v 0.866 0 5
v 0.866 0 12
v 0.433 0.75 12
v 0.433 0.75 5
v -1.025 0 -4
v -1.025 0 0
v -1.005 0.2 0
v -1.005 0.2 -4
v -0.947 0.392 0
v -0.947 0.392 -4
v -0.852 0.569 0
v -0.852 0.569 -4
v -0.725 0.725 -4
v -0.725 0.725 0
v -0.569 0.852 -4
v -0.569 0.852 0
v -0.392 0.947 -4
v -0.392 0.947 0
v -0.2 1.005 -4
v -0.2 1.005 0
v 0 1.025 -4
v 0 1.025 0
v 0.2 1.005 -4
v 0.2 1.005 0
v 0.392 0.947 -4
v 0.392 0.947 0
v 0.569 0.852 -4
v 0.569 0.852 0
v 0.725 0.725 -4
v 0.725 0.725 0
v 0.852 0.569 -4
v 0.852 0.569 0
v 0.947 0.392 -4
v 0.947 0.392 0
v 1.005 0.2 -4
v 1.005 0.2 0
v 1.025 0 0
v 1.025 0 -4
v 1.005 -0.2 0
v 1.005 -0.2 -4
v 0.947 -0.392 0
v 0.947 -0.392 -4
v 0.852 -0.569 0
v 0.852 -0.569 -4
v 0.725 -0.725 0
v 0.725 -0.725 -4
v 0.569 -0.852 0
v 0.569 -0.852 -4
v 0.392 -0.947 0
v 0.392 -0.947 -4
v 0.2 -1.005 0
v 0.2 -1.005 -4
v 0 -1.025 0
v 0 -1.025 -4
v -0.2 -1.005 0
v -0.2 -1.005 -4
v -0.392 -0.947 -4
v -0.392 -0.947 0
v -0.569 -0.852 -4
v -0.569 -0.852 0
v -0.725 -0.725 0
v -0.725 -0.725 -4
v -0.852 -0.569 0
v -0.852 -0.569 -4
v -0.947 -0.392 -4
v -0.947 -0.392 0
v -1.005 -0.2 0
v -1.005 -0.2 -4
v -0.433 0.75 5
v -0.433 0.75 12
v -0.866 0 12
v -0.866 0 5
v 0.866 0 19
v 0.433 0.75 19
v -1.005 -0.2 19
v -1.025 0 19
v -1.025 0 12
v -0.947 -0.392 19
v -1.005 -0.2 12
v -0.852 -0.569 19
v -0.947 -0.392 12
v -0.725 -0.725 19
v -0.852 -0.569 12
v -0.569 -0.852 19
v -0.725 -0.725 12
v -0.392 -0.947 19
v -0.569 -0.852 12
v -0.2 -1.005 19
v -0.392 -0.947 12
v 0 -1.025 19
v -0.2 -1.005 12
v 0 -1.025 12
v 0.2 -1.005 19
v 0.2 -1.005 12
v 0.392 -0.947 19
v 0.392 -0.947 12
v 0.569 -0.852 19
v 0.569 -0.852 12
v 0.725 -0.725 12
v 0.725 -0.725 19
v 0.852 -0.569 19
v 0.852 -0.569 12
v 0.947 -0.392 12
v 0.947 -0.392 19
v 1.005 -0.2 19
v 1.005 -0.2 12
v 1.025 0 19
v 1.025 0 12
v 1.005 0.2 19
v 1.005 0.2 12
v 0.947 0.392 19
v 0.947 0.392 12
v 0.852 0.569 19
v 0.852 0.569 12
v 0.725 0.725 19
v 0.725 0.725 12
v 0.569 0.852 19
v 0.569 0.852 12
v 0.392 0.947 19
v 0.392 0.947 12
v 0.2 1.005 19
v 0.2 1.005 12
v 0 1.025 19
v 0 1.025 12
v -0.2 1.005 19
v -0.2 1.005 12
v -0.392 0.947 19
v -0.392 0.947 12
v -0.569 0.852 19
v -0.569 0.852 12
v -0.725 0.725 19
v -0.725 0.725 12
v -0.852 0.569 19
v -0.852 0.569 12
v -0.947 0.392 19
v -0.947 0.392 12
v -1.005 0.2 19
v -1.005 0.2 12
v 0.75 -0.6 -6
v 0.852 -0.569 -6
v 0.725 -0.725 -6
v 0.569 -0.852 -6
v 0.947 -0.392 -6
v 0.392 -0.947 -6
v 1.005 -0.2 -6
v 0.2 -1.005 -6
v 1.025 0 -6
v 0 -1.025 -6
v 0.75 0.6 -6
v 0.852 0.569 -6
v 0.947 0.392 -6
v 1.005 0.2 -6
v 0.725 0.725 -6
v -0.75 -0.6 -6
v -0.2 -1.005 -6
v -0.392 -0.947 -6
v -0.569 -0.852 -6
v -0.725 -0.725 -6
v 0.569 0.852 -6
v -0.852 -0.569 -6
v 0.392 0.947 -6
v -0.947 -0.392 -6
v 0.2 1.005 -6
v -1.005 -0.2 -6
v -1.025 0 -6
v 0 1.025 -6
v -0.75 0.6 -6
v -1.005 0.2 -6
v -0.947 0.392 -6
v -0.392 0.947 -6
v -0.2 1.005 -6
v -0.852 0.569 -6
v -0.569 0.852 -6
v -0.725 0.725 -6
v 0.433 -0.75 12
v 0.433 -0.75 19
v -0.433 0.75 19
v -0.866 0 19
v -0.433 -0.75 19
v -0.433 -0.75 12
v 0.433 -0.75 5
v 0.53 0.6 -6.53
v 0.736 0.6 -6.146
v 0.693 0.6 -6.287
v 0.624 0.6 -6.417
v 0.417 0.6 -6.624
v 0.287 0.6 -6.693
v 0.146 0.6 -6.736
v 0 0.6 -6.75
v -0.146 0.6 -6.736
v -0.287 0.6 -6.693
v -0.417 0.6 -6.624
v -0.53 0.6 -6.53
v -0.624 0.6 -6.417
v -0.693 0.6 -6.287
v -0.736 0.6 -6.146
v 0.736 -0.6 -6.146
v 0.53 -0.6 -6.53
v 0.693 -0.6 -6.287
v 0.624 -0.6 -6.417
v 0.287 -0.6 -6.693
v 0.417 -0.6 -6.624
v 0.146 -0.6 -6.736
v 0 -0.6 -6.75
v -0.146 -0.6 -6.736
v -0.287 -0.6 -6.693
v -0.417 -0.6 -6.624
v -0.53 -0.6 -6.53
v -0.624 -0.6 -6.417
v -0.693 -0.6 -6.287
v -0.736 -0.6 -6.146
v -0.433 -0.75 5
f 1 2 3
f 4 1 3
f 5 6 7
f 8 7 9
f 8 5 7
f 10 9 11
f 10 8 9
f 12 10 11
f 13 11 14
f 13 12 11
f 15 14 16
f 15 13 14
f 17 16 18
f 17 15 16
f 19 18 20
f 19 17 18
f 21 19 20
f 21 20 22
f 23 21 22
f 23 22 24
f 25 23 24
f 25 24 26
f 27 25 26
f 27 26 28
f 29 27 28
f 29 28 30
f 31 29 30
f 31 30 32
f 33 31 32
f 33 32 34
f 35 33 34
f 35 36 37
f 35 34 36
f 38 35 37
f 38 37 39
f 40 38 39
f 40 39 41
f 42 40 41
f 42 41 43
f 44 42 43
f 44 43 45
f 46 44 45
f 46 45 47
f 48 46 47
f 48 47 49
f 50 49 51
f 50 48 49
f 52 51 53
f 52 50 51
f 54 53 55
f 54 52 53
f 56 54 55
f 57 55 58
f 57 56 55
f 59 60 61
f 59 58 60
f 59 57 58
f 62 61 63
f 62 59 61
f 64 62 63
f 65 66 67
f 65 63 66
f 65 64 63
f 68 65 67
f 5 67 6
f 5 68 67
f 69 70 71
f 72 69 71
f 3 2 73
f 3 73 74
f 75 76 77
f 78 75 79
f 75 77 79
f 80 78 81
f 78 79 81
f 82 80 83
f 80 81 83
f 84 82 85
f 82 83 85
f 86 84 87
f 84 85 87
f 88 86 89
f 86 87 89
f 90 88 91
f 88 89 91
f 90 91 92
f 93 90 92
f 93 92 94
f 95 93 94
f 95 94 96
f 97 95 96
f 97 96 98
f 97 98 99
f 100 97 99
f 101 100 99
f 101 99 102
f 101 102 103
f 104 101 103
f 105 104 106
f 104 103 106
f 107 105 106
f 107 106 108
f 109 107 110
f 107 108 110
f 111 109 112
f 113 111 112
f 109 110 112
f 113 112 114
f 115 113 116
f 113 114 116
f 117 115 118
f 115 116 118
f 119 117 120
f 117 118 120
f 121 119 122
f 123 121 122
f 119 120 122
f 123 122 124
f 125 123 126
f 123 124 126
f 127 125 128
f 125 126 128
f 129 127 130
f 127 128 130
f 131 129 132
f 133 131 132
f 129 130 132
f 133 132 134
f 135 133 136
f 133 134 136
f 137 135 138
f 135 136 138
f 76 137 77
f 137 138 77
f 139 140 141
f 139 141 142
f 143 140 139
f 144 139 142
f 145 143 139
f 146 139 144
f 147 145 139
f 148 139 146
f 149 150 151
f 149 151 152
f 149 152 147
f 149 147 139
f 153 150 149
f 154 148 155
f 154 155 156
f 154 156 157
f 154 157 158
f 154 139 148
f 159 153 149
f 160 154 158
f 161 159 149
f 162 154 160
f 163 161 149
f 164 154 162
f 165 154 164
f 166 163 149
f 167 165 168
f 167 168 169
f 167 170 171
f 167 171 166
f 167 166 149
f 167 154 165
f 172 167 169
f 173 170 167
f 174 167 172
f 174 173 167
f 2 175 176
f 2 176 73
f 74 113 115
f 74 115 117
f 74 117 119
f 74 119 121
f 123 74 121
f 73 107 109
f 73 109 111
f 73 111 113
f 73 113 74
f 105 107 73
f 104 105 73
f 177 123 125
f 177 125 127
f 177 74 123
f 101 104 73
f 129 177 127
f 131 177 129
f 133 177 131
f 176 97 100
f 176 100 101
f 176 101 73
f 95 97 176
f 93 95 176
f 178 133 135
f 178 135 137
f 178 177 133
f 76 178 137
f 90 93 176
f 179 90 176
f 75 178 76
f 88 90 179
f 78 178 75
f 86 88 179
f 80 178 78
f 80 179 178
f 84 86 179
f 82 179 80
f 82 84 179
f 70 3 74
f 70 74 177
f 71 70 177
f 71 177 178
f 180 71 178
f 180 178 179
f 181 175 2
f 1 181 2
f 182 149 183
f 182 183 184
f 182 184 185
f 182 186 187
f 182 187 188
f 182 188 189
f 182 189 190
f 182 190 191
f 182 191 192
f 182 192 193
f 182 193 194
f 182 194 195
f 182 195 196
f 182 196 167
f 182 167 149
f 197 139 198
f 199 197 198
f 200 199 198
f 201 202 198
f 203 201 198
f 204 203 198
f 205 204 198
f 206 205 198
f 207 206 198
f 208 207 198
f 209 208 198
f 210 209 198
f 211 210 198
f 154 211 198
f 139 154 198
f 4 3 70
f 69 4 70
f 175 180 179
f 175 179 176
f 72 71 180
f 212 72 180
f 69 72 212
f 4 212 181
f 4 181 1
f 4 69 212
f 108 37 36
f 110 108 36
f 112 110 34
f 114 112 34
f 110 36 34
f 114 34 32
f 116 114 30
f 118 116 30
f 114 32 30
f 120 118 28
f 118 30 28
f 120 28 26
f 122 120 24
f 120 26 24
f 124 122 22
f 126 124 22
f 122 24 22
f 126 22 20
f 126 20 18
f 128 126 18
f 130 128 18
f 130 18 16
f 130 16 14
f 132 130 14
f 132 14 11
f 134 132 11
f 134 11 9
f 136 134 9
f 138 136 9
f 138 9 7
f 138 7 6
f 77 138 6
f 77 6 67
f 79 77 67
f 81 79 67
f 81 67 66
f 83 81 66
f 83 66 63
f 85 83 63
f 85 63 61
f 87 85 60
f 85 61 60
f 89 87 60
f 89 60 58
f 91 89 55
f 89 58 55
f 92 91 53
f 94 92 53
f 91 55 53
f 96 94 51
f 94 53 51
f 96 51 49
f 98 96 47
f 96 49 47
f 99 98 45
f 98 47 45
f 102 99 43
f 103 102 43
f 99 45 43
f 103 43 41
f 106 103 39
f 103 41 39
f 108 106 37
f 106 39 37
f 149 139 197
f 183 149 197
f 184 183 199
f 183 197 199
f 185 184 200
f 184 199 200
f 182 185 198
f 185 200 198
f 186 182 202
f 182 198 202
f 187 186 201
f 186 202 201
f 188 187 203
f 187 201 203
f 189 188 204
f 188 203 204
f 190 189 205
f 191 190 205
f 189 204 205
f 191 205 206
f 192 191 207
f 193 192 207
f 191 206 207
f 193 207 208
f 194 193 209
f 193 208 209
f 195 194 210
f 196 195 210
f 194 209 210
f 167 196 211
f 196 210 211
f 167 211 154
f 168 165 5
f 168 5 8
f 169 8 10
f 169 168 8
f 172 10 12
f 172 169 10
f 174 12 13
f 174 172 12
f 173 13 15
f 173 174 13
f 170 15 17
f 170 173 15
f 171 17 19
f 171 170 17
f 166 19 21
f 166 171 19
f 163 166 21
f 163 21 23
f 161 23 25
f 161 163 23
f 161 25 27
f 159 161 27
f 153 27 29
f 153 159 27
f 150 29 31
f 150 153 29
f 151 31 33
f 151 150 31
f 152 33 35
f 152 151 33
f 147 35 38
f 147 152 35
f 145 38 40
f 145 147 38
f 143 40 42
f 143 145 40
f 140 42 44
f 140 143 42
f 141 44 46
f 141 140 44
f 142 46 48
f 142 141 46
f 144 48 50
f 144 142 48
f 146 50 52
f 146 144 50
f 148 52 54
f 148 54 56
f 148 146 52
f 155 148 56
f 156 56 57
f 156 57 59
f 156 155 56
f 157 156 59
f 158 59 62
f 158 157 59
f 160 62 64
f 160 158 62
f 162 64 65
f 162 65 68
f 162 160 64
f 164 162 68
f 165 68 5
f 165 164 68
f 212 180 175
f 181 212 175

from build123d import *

# Parameters (mm, degrees)
SKETCH1_R                = 1.025
BOSS_EXTRUDE1_DEPTH      = 12
CUT_EXTRUDE1_DEPTH       = 7
BOSS_EXTRUDE2_START      = 4
SKETCH3_R                = 1.025
BOSS_EXTRUDE2_DEPTH      = 4
SKETCH6_R                = 1.025
BOSS_EXTRUDE5_DEPTH      = 7
BOSS_EXTRUDE6_START      = 2
SKETCH7_R                = 1.025
BOSS_EXTRUDE6_DEPTH      = 2
BOSS_EXTRUDE8_DEPTH      = 0.6
BOSS_EXTRUDE8_DEPTH_BACK = 0.6


with BuildPart() as part:
    # Sketch1 → Boss-Extrude1 (new body)
    with BuildSketch(Plane.XY):
        Circle(SKETCH1_R)
    extrude(amount=BOSS_EXTRUDE1_DEPTH)

    # Sketch2 → Cut-Extrude1 (cut)
    with BuildSketch(Plane.XY.offset(12)):
        Polygon((0.866025404, 0), (0.433012702, 0.75), (-0.433012702, 0.75), (-0.866025404, 0), (-0.433012702, -0.75), (0.433012702, -0.75), align=None)
    extrude(amount=-CUT_EXTRUDE1_DEPTH, mode=Mode.SUBTRACT)

    # Sketch3 → Boss-Extrude2 (add)
    with BuildSketch(Plane(origin=(0, 0, 0), x_dir=(-1, 0, 0), z_dir=(0, 0, -1)).offset(BOSS_EXTRUDE2_START)):
        Circle(SKETCH3_R)
    extrude(amount=-BOSS_EXTRUDE2_DEPTH)

    # Sketch6 → Boss-Extrude5 (add)
    with BuildSketch(Plane.XY.offset(12)):
        with Locations(Location((0, 0, 0), (0, 0, 180))):
            Circle(SKETCH6_R)
        Polygon((0.866025404, 0), (0.433012702, 0.75), (-0.433012702, 0.75), (-0.866025404, 0), (-0.433012702, -0.75), (0.433012702, -0.75), align=None, mode=Mode.SUBTRACT)
    extrude(amount=BOSS_EXTRUDE5_DEPTH)

    # Sketch7 → Boss-Extrude6 (add)
    with BuildSketch(Plane(origin=(0, 0, -4), x_dir=(-1, 0, 0), z_dir=(0, 0, -1)).offset(BOSS_EXTRUDE6_START)):
        Circle(SKETCH7_R)
    extrude(amount=-BOSS_EXTRUDE6_DEPTH)

    # Sketch8 → Boss-Extrude8 (add, two sides: drawn at the far end of the back side and taken through both)
    with BuildSketch(Plane(origin=(0, 0, 0), x_dir=(1, 0, 0), z_dir=(0, 1, 0)).offset(-BOSS_EXTRUDE8_DEPTH_BACK)):
        with BuildLine():
            ThreePointArc((0.75, 6), (0, 6.75), (-0.75, 6))
            Line((-0.75, 6), (0.75, 6))
        make_face()
        with BuildLine():
            Line((0.75, 6), (-0.75, 6))
            ThreePointArc((-0.75, 6), (0, 5.25), (0.75, 6))
        make_face()
    extrude(amount=BOSS_EXTRUDE8_DEPTH + BOSS_EXTRUDE8_DEPTH_BACK)


solid = part.part
